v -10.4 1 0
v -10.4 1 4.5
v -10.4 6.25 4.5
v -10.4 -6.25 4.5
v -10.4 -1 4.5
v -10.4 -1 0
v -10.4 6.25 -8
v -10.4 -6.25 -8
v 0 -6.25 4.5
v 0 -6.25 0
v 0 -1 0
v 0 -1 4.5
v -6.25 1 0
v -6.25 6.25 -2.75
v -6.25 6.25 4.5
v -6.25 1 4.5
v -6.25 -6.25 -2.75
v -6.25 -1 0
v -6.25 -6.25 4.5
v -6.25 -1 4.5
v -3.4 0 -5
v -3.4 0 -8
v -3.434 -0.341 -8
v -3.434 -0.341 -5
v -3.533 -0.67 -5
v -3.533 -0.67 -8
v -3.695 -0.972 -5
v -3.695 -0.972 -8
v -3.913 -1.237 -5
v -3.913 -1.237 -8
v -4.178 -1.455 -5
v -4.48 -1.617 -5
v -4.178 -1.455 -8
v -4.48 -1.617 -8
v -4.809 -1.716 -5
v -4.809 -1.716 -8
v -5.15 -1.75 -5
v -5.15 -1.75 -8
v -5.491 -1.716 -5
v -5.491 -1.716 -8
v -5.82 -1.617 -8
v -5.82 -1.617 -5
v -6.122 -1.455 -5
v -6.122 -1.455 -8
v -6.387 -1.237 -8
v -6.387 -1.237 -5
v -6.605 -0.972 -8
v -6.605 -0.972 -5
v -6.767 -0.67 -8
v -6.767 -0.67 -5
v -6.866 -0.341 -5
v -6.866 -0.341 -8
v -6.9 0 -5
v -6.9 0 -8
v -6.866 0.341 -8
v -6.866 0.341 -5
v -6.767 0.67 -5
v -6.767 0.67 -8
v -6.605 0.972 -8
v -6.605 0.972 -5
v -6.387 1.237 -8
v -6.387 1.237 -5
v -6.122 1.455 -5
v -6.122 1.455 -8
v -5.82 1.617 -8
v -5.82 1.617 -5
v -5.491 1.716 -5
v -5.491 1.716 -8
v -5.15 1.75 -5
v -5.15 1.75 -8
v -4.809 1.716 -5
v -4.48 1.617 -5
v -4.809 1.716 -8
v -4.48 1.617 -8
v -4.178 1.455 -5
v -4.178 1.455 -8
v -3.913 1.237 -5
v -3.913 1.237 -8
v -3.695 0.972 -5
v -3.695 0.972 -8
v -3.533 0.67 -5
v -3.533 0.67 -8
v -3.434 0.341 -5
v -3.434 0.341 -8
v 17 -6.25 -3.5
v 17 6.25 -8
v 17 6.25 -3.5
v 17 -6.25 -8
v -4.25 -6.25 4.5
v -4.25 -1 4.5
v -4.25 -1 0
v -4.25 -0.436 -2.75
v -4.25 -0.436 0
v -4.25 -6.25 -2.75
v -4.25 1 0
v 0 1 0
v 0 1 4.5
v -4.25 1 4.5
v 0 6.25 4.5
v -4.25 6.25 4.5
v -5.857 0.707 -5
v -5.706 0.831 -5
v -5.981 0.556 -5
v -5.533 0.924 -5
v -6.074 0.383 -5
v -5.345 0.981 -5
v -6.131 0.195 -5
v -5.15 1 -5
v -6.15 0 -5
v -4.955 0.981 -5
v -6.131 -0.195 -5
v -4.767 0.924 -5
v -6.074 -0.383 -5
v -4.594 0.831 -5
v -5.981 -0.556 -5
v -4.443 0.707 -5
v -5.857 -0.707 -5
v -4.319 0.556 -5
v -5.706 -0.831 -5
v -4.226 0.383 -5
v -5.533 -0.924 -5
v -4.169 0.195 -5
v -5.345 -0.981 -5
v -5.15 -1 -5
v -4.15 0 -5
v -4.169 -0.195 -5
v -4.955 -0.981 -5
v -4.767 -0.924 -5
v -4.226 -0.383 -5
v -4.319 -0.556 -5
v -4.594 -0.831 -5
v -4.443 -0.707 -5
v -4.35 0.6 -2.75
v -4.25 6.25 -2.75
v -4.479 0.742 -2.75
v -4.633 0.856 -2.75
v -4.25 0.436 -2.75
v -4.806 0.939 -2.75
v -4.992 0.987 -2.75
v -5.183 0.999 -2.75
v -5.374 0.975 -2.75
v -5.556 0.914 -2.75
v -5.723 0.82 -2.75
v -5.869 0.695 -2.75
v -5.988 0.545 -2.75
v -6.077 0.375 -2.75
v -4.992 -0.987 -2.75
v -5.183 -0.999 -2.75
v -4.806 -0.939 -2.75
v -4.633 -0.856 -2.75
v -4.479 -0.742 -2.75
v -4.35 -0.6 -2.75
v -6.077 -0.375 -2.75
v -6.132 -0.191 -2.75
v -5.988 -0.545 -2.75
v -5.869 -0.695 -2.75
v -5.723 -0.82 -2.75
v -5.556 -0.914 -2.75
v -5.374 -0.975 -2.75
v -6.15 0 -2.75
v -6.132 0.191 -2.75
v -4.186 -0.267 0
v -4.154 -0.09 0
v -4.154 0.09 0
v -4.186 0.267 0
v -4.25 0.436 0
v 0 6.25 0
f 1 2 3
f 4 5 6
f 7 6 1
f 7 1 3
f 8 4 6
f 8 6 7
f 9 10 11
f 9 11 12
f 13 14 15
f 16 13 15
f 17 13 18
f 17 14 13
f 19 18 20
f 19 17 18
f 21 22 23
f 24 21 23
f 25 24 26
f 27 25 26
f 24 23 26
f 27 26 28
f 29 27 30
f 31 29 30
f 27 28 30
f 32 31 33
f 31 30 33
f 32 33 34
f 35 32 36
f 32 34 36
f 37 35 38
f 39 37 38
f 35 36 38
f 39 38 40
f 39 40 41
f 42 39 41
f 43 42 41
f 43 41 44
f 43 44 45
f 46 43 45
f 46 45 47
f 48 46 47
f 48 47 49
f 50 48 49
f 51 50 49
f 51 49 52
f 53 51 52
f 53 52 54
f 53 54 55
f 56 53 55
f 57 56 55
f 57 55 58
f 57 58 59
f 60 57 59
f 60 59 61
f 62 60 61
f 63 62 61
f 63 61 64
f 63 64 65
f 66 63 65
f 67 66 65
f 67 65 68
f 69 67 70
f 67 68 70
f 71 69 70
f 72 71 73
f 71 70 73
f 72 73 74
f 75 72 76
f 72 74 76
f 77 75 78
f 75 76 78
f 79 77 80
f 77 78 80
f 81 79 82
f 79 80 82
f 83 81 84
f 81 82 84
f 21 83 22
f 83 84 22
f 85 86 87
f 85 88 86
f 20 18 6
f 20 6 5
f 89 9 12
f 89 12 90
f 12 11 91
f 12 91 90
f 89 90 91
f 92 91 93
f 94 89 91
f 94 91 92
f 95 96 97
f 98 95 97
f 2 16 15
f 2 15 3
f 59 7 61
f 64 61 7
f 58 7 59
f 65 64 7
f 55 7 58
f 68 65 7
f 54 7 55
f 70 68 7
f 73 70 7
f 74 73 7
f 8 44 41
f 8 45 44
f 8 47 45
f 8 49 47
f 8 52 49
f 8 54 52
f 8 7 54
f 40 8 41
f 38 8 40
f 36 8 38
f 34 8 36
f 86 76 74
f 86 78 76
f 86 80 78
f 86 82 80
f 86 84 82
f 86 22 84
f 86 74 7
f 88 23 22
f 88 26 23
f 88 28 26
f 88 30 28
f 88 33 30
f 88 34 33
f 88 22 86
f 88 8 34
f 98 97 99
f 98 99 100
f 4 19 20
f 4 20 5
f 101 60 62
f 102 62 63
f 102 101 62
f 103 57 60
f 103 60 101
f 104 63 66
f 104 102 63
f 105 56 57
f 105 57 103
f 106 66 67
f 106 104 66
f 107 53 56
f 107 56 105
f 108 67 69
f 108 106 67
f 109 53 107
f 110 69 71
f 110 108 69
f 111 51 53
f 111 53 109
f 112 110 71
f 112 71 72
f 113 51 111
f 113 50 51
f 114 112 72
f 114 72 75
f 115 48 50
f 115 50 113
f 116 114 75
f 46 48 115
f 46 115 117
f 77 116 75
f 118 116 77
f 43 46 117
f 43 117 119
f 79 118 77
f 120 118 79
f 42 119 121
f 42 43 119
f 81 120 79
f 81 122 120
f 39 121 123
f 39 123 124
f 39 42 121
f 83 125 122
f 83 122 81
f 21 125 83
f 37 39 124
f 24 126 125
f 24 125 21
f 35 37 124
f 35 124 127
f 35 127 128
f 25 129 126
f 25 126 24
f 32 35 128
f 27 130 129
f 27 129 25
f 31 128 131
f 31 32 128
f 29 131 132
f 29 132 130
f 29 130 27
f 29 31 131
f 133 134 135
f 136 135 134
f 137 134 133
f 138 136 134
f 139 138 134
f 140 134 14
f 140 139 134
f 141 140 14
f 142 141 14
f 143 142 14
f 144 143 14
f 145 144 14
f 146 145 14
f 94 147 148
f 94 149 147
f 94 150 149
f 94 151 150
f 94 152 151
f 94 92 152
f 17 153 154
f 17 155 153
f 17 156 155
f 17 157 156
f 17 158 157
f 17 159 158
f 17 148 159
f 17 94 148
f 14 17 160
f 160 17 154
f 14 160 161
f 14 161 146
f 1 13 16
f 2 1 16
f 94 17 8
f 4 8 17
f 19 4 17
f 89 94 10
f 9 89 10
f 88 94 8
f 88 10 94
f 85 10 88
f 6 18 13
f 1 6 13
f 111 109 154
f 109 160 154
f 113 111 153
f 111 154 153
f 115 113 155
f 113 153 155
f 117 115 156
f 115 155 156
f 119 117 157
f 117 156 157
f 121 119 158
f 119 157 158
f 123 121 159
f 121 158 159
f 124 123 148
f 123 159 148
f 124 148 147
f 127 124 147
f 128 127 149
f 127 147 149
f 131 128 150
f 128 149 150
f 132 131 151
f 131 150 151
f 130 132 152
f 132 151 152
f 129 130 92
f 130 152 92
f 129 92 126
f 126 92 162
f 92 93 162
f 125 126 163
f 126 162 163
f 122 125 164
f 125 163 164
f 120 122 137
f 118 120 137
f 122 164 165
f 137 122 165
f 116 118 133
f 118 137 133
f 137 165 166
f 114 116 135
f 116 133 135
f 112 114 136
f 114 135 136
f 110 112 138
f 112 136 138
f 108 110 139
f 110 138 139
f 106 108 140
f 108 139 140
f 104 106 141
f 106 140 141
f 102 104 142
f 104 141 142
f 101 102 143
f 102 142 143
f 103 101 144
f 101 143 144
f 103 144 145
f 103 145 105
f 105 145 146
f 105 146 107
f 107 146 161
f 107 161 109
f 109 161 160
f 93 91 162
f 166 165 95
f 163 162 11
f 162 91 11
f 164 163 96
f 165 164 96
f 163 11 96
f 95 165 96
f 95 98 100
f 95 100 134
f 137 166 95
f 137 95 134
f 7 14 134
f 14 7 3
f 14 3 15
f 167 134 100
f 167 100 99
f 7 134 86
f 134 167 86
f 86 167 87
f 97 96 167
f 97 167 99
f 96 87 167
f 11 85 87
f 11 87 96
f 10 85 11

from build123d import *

# Parameters (mm, degrees)
F1_DEPTH       = 6.25
F2_W           = 2
F2_H           = 4.5
F3_DEPTH       = 10.401
F5_D           = 2
F5_DEPTH       = 38
F5_CBORE_D     = 3.5
F5_CBORE_DEPTH = 3
F5_TIP         = 0.600860619


with BuildPart() as f1:
    # F0 (on Front) → F1 (new body, symmetric)
    with BuildSketch(Plane.XZ):
        Polygon((17, -3.5), (0, 0), (0, 4.5), (-4.25, 4.5), (-4.25, -2.75), (-6.25, -2.75), (-6.25, 4.5), (-10.4, 4.5), (-10.4, -8), (17, -8), align=None)
    extrude(amount=F1_DEPTH, both=True)

    # F2 (on Right) → F3 (cut, through all)
    with BuildSketch(Plane.YZ):
        with Locations((0, 2.25)):
            Rectangle(F2_W, F2_H)
    extrude(amount=-F3_DEPTH, mode=Mode.SUBTRACT)

    # F5
    with Locations(Plane(origin=(0, 0, -8), x_dir=(1, 0, 0), z_dir=(0, 0, -1))):
        with Locations((-5.15, 0)):
            CounterBoreHole(F5_D / 2, F5_CBORE_D / 2, F5_CBORE_DEPTH, depth=F5_DEPTH)
            with Locations((0, 0, -(F5_DEPTH + F5_TIP / 2))):  # 118° drill point
                Cone(0, F5_D / 2, F5_TIP, mode=Mode.SUBTRACT)


solid = f1.part
